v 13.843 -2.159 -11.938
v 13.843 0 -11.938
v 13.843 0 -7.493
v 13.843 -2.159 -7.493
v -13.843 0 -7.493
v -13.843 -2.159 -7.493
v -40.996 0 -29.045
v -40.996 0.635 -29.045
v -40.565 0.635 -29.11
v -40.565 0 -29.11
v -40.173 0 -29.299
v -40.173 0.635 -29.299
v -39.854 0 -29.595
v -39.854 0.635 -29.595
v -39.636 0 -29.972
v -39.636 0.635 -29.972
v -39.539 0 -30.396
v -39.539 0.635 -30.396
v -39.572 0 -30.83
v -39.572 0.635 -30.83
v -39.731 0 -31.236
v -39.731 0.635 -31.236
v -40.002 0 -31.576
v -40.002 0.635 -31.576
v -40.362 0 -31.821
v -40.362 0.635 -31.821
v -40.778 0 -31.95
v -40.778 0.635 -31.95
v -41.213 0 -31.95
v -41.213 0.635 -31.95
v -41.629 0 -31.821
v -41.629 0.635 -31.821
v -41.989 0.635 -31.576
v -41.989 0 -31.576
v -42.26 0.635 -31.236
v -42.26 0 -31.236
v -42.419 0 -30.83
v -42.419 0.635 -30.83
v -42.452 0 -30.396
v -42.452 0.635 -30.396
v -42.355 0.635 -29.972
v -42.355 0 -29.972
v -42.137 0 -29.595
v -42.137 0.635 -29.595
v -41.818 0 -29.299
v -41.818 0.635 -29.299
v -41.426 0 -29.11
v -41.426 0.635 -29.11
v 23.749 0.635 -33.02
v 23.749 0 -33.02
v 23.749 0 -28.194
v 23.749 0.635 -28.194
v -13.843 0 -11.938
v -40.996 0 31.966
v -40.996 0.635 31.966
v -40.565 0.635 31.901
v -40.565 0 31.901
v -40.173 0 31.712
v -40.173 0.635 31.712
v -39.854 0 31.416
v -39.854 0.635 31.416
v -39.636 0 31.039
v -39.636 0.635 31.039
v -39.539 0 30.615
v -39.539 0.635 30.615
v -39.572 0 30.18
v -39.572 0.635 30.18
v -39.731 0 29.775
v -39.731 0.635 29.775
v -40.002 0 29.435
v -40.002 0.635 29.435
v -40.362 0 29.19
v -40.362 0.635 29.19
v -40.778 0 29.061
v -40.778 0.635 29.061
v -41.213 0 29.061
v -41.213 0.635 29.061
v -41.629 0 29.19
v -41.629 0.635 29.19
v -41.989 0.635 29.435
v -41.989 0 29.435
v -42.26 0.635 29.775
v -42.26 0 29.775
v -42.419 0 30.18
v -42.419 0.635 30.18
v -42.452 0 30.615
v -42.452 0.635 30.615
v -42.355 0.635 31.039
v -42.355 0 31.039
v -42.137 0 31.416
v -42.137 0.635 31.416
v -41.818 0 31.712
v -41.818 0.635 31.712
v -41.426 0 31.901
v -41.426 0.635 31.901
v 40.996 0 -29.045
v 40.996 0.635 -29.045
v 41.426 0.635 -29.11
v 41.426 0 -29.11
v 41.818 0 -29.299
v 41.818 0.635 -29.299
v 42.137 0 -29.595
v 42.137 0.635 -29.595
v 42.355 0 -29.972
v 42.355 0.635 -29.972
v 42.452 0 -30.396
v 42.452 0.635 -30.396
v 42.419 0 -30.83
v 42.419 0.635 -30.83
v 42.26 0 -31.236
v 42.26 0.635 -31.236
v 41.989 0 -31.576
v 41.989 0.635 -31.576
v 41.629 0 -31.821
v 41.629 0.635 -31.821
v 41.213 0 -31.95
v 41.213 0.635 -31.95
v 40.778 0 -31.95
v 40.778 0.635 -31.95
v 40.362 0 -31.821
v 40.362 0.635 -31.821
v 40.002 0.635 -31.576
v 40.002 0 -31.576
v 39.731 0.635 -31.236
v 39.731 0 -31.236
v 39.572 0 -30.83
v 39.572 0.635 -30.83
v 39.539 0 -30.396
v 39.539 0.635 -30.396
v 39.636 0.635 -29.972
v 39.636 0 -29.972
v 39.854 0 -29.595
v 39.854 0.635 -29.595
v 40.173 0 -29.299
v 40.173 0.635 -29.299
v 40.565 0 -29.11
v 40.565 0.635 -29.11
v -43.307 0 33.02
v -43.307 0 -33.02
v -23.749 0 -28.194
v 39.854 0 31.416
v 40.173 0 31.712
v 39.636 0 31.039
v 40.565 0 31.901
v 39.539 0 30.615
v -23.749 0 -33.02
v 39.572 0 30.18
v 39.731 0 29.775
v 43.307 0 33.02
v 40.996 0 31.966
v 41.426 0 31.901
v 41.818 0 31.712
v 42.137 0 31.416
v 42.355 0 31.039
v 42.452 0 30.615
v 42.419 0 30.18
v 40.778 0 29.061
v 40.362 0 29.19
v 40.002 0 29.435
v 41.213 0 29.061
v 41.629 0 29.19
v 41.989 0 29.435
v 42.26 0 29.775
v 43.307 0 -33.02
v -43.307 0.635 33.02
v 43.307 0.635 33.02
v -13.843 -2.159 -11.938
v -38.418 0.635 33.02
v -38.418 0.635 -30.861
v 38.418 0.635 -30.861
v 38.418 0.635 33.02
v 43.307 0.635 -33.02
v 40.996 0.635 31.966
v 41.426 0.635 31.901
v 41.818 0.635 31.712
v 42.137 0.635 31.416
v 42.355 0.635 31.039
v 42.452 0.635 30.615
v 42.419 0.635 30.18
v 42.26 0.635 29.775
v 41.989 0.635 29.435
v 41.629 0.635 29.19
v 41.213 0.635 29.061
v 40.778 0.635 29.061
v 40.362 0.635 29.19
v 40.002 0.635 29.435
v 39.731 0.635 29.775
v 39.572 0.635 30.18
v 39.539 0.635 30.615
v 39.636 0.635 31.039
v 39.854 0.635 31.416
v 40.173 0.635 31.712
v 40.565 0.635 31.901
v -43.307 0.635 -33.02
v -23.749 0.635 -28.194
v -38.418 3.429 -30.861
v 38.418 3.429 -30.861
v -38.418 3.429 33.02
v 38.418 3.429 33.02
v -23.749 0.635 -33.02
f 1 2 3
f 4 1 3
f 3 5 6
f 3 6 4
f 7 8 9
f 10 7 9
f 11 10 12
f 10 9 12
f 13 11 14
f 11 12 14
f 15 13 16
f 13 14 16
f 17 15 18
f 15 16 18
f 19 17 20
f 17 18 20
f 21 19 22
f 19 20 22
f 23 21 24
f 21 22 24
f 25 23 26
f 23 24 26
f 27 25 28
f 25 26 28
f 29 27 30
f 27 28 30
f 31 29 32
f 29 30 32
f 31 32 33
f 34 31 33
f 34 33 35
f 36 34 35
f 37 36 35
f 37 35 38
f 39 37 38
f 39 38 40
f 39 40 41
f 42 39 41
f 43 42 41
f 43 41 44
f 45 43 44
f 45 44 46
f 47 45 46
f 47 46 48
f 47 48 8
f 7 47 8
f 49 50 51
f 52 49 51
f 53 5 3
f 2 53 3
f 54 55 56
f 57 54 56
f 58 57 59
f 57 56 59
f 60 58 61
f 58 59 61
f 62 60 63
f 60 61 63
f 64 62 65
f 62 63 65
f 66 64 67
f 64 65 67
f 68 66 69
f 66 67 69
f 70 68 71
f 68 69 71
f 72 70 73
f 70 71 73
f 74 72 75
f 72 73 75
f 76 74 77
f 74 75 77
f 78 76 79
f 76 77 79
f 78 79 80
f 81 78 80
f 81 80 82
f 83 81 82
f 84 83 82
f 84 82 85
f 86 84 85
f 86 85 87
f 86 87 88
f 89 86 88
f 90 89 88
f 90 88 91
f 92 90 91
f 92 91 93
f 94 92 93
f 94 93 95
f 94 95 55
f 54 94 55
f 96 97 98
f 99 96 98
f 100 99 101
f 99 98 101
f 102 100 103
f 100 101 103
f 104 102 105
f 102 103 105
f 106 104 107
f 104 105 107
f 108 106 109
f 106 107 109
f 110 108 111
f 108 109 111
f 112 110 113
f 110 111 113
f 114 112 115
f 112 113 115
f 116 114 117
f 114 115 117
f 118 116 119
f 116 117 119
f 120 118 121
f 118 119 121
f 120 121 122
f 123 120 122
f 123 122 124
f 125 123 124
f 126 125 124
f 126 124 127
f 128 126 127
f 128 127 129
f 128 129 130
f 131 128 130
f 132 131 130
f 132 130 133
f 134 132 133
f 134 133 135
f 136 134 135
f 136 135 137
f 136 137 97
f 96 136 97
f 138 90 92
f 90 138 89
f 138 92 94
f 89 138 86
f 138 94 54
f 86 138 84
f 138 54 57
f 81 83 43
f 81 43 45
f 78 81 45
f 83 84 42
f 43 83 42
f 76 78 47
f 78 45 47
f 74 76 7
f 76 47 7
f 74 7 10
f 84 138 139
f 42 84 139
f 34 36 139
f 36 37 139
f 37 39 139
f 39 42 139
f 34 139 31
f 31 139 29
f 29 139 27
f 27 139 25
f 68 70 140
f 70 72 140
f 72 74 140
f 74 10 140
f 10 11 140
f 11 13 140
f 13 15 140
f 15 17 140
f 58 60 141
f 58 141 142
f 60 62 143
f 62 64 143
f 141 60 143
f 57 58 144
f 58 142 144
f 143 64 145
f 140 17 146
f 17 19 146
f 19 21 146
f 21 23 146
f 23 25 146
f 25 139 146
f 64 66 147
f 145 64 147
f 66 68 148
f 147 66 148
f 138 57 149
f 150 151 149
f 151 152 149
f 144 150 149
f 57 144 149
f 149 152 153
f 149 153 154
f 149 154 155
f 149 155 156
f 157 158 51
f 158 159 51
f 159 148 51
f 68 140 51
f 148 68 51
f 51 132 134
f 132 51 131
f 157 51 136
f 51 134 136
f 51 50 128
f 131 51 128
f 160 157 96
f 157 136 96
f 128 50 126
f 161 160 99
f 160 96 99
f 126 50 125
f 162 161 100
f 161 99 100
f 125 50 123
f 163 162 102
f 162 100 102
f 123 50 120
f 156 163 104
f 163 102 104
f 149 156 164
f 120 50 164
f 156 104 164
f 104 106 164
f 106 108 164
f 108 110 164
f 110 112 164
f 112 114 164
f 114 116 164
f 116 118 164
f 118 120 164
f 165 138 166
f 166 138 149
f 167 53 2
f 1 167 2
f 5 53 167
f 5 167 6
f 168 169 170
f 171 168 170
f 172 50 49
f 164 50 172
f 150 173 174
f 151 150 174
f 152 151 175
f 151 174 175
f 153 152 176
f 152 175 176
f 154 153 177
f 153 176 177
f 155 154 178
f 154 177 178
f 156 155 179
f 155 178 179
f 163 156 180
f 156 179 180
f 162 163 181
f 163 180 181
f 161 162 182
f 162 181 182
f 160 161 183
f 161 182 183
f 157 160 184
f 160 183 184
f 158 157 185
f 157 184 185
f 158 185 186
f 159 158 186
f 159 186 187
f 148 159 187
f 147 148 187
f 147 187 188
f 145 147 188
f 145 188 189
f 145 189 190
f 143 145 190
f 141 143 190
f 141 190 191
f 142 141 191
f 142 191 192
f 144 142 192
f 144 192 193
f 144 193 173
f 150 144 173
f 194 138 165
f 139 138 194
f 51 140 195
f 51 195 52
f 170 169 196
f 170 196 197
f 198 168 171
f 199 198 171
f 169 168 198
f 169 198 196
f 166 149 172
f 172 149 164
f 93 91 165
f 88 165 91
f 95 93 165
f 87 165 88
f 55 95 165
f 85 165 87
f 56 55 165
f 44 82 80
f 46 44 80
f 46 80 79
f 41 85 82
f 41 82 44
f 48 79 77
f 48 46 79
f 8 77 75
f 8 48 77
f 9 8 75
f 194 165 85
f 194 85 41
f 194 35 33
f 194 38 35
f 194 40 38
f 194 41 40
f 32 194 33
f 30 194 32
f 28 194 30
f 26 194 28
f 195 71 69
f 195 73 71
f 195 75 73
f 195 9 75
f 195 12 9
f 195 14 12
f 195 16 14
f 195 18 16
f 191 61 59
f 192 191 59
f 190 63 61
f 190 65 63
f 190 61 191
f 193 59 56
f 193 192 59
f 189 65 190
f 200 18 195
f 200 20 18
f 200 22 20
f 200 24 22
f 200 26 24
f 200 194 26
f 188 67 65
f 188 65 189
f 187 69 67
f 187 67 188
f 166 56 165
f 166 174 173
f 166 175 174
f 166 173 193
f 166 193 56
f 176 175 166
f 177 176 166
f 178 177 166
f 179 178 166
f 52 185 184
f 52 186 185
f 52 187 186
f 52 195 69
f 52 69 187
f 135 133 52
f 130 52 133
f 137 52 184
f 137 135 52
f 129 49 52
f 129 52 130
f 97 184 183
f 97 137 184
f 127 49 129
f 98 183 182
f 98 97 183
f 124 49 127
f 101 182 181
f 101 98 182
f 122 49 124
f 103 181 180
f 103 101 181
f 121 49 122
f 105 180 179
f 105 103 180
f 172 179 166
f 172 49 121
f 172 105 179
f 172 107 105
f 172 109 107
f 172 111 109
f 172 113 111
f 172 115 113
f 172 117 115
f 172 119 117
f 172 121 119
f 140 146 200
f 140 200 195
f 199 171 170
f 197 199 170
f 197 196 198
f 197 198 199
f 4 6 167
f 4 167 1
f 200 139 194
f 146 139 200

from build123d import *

# Parameters (mm, degrees)
SKETCH1_W           = 86.614
SKETCH1_H           = 66.04
BOSS_EXTRUDE1_DEPTH = 0.635
SKETCH2_W           = 47.498
SKETCH2_H           = 4.826
CUT_EXTRUDE1_DEPTH  = 0.635
SKETCH3_W           = 76.835
SKETCH3_H           = 63.881
BOSS_EXTRUDE2_DEPTH = 2.794
SKETCH4_W           = 27.686
SKETCH4_H           = 4.445
BOSS_EXTRUDE3_DEPTH = 2.159
SKETCH6_R           = 1.4605
CUT_EXTRUDE2_DEPTH  = 55.745249958


with BuildPart() as part:
    # Sketch1 → Boss-Extrude1 (new body)
    with BuildSketch(Plane(origin=(0, 0, 0), x_dir=(1, 0, 0), z_dir=(0, 1, 0))):
        Rectangle(SKETCH1_W, SKETCH1_H)
    extrude(amount=BOSS_EXTRUDE1_DEPTH)

    # Sketch2 → Cut-Extrude1 (cut)
    with BuildSketch(Plane.XZ):
        with Locations((0, -30.607)):
            Rectangle(SKETCH2_W, SKETCH2_H)
    extrude(amount=-CUT_EXTRUDE1_DEPTH, mode=Mode.SUBTRACT)

    # Sketch6 → Cut-Extrude2 (cut, through all)
    with BuildSketch(Plane(origin=(0, 3.429, 0), x_dir=(1, 0, 0), z_dir=(0, 1, 0))):
        with Locations(Location((-40.9956, 30.5054, 0), (0, 0, 270))):
            Circle(SKETCH6_R)
        with Locations(Location((-40.9956, -30.5054, 0), (0, 0, 270))):
            Circle(SKETCH6_R)
        with Locations(Location((40.9956, -30.5054, 0), (0, 0, 270))):
            Circle(SKETCH6_R)
        with Locations(Location((40.9956, 30.5054, 0), (0, 0, 270))):
            Circle(SKETCH6_R)
    extrude(amount=-CUT_EXTRUDE2_DEPTH, mode=Mode.SUBTRACT)


with BuildPart() as body_2:
    # Sketch3 → Boss-Extrude2 (new body)
    with BuildSketch(Plane(origin=(0, 0.635, 0), x_dir=(1, 0, 0), z_dir=(0, 1, 0))):
        with Locations((0, -1.0795)):
            Rectangle(SKETCH3_W, SKETCH3_H)
    extrude(amount=BOSS_EXTRUDE2_DEPTH)


with BuildPart() as body_3:
    # Sketch4 → Boss-Extrude3 (new body)
    with BuildSketch(Plane.XZ):
        with Locations((0, -9.7155)):
            Rectangle(SKETCH4_W, SKETCH4_H)
    extrude(amount=BOSS_EXTRUDE3_DEPTH)


solid = Compound([part.part, body_2.part, body_3.part])
